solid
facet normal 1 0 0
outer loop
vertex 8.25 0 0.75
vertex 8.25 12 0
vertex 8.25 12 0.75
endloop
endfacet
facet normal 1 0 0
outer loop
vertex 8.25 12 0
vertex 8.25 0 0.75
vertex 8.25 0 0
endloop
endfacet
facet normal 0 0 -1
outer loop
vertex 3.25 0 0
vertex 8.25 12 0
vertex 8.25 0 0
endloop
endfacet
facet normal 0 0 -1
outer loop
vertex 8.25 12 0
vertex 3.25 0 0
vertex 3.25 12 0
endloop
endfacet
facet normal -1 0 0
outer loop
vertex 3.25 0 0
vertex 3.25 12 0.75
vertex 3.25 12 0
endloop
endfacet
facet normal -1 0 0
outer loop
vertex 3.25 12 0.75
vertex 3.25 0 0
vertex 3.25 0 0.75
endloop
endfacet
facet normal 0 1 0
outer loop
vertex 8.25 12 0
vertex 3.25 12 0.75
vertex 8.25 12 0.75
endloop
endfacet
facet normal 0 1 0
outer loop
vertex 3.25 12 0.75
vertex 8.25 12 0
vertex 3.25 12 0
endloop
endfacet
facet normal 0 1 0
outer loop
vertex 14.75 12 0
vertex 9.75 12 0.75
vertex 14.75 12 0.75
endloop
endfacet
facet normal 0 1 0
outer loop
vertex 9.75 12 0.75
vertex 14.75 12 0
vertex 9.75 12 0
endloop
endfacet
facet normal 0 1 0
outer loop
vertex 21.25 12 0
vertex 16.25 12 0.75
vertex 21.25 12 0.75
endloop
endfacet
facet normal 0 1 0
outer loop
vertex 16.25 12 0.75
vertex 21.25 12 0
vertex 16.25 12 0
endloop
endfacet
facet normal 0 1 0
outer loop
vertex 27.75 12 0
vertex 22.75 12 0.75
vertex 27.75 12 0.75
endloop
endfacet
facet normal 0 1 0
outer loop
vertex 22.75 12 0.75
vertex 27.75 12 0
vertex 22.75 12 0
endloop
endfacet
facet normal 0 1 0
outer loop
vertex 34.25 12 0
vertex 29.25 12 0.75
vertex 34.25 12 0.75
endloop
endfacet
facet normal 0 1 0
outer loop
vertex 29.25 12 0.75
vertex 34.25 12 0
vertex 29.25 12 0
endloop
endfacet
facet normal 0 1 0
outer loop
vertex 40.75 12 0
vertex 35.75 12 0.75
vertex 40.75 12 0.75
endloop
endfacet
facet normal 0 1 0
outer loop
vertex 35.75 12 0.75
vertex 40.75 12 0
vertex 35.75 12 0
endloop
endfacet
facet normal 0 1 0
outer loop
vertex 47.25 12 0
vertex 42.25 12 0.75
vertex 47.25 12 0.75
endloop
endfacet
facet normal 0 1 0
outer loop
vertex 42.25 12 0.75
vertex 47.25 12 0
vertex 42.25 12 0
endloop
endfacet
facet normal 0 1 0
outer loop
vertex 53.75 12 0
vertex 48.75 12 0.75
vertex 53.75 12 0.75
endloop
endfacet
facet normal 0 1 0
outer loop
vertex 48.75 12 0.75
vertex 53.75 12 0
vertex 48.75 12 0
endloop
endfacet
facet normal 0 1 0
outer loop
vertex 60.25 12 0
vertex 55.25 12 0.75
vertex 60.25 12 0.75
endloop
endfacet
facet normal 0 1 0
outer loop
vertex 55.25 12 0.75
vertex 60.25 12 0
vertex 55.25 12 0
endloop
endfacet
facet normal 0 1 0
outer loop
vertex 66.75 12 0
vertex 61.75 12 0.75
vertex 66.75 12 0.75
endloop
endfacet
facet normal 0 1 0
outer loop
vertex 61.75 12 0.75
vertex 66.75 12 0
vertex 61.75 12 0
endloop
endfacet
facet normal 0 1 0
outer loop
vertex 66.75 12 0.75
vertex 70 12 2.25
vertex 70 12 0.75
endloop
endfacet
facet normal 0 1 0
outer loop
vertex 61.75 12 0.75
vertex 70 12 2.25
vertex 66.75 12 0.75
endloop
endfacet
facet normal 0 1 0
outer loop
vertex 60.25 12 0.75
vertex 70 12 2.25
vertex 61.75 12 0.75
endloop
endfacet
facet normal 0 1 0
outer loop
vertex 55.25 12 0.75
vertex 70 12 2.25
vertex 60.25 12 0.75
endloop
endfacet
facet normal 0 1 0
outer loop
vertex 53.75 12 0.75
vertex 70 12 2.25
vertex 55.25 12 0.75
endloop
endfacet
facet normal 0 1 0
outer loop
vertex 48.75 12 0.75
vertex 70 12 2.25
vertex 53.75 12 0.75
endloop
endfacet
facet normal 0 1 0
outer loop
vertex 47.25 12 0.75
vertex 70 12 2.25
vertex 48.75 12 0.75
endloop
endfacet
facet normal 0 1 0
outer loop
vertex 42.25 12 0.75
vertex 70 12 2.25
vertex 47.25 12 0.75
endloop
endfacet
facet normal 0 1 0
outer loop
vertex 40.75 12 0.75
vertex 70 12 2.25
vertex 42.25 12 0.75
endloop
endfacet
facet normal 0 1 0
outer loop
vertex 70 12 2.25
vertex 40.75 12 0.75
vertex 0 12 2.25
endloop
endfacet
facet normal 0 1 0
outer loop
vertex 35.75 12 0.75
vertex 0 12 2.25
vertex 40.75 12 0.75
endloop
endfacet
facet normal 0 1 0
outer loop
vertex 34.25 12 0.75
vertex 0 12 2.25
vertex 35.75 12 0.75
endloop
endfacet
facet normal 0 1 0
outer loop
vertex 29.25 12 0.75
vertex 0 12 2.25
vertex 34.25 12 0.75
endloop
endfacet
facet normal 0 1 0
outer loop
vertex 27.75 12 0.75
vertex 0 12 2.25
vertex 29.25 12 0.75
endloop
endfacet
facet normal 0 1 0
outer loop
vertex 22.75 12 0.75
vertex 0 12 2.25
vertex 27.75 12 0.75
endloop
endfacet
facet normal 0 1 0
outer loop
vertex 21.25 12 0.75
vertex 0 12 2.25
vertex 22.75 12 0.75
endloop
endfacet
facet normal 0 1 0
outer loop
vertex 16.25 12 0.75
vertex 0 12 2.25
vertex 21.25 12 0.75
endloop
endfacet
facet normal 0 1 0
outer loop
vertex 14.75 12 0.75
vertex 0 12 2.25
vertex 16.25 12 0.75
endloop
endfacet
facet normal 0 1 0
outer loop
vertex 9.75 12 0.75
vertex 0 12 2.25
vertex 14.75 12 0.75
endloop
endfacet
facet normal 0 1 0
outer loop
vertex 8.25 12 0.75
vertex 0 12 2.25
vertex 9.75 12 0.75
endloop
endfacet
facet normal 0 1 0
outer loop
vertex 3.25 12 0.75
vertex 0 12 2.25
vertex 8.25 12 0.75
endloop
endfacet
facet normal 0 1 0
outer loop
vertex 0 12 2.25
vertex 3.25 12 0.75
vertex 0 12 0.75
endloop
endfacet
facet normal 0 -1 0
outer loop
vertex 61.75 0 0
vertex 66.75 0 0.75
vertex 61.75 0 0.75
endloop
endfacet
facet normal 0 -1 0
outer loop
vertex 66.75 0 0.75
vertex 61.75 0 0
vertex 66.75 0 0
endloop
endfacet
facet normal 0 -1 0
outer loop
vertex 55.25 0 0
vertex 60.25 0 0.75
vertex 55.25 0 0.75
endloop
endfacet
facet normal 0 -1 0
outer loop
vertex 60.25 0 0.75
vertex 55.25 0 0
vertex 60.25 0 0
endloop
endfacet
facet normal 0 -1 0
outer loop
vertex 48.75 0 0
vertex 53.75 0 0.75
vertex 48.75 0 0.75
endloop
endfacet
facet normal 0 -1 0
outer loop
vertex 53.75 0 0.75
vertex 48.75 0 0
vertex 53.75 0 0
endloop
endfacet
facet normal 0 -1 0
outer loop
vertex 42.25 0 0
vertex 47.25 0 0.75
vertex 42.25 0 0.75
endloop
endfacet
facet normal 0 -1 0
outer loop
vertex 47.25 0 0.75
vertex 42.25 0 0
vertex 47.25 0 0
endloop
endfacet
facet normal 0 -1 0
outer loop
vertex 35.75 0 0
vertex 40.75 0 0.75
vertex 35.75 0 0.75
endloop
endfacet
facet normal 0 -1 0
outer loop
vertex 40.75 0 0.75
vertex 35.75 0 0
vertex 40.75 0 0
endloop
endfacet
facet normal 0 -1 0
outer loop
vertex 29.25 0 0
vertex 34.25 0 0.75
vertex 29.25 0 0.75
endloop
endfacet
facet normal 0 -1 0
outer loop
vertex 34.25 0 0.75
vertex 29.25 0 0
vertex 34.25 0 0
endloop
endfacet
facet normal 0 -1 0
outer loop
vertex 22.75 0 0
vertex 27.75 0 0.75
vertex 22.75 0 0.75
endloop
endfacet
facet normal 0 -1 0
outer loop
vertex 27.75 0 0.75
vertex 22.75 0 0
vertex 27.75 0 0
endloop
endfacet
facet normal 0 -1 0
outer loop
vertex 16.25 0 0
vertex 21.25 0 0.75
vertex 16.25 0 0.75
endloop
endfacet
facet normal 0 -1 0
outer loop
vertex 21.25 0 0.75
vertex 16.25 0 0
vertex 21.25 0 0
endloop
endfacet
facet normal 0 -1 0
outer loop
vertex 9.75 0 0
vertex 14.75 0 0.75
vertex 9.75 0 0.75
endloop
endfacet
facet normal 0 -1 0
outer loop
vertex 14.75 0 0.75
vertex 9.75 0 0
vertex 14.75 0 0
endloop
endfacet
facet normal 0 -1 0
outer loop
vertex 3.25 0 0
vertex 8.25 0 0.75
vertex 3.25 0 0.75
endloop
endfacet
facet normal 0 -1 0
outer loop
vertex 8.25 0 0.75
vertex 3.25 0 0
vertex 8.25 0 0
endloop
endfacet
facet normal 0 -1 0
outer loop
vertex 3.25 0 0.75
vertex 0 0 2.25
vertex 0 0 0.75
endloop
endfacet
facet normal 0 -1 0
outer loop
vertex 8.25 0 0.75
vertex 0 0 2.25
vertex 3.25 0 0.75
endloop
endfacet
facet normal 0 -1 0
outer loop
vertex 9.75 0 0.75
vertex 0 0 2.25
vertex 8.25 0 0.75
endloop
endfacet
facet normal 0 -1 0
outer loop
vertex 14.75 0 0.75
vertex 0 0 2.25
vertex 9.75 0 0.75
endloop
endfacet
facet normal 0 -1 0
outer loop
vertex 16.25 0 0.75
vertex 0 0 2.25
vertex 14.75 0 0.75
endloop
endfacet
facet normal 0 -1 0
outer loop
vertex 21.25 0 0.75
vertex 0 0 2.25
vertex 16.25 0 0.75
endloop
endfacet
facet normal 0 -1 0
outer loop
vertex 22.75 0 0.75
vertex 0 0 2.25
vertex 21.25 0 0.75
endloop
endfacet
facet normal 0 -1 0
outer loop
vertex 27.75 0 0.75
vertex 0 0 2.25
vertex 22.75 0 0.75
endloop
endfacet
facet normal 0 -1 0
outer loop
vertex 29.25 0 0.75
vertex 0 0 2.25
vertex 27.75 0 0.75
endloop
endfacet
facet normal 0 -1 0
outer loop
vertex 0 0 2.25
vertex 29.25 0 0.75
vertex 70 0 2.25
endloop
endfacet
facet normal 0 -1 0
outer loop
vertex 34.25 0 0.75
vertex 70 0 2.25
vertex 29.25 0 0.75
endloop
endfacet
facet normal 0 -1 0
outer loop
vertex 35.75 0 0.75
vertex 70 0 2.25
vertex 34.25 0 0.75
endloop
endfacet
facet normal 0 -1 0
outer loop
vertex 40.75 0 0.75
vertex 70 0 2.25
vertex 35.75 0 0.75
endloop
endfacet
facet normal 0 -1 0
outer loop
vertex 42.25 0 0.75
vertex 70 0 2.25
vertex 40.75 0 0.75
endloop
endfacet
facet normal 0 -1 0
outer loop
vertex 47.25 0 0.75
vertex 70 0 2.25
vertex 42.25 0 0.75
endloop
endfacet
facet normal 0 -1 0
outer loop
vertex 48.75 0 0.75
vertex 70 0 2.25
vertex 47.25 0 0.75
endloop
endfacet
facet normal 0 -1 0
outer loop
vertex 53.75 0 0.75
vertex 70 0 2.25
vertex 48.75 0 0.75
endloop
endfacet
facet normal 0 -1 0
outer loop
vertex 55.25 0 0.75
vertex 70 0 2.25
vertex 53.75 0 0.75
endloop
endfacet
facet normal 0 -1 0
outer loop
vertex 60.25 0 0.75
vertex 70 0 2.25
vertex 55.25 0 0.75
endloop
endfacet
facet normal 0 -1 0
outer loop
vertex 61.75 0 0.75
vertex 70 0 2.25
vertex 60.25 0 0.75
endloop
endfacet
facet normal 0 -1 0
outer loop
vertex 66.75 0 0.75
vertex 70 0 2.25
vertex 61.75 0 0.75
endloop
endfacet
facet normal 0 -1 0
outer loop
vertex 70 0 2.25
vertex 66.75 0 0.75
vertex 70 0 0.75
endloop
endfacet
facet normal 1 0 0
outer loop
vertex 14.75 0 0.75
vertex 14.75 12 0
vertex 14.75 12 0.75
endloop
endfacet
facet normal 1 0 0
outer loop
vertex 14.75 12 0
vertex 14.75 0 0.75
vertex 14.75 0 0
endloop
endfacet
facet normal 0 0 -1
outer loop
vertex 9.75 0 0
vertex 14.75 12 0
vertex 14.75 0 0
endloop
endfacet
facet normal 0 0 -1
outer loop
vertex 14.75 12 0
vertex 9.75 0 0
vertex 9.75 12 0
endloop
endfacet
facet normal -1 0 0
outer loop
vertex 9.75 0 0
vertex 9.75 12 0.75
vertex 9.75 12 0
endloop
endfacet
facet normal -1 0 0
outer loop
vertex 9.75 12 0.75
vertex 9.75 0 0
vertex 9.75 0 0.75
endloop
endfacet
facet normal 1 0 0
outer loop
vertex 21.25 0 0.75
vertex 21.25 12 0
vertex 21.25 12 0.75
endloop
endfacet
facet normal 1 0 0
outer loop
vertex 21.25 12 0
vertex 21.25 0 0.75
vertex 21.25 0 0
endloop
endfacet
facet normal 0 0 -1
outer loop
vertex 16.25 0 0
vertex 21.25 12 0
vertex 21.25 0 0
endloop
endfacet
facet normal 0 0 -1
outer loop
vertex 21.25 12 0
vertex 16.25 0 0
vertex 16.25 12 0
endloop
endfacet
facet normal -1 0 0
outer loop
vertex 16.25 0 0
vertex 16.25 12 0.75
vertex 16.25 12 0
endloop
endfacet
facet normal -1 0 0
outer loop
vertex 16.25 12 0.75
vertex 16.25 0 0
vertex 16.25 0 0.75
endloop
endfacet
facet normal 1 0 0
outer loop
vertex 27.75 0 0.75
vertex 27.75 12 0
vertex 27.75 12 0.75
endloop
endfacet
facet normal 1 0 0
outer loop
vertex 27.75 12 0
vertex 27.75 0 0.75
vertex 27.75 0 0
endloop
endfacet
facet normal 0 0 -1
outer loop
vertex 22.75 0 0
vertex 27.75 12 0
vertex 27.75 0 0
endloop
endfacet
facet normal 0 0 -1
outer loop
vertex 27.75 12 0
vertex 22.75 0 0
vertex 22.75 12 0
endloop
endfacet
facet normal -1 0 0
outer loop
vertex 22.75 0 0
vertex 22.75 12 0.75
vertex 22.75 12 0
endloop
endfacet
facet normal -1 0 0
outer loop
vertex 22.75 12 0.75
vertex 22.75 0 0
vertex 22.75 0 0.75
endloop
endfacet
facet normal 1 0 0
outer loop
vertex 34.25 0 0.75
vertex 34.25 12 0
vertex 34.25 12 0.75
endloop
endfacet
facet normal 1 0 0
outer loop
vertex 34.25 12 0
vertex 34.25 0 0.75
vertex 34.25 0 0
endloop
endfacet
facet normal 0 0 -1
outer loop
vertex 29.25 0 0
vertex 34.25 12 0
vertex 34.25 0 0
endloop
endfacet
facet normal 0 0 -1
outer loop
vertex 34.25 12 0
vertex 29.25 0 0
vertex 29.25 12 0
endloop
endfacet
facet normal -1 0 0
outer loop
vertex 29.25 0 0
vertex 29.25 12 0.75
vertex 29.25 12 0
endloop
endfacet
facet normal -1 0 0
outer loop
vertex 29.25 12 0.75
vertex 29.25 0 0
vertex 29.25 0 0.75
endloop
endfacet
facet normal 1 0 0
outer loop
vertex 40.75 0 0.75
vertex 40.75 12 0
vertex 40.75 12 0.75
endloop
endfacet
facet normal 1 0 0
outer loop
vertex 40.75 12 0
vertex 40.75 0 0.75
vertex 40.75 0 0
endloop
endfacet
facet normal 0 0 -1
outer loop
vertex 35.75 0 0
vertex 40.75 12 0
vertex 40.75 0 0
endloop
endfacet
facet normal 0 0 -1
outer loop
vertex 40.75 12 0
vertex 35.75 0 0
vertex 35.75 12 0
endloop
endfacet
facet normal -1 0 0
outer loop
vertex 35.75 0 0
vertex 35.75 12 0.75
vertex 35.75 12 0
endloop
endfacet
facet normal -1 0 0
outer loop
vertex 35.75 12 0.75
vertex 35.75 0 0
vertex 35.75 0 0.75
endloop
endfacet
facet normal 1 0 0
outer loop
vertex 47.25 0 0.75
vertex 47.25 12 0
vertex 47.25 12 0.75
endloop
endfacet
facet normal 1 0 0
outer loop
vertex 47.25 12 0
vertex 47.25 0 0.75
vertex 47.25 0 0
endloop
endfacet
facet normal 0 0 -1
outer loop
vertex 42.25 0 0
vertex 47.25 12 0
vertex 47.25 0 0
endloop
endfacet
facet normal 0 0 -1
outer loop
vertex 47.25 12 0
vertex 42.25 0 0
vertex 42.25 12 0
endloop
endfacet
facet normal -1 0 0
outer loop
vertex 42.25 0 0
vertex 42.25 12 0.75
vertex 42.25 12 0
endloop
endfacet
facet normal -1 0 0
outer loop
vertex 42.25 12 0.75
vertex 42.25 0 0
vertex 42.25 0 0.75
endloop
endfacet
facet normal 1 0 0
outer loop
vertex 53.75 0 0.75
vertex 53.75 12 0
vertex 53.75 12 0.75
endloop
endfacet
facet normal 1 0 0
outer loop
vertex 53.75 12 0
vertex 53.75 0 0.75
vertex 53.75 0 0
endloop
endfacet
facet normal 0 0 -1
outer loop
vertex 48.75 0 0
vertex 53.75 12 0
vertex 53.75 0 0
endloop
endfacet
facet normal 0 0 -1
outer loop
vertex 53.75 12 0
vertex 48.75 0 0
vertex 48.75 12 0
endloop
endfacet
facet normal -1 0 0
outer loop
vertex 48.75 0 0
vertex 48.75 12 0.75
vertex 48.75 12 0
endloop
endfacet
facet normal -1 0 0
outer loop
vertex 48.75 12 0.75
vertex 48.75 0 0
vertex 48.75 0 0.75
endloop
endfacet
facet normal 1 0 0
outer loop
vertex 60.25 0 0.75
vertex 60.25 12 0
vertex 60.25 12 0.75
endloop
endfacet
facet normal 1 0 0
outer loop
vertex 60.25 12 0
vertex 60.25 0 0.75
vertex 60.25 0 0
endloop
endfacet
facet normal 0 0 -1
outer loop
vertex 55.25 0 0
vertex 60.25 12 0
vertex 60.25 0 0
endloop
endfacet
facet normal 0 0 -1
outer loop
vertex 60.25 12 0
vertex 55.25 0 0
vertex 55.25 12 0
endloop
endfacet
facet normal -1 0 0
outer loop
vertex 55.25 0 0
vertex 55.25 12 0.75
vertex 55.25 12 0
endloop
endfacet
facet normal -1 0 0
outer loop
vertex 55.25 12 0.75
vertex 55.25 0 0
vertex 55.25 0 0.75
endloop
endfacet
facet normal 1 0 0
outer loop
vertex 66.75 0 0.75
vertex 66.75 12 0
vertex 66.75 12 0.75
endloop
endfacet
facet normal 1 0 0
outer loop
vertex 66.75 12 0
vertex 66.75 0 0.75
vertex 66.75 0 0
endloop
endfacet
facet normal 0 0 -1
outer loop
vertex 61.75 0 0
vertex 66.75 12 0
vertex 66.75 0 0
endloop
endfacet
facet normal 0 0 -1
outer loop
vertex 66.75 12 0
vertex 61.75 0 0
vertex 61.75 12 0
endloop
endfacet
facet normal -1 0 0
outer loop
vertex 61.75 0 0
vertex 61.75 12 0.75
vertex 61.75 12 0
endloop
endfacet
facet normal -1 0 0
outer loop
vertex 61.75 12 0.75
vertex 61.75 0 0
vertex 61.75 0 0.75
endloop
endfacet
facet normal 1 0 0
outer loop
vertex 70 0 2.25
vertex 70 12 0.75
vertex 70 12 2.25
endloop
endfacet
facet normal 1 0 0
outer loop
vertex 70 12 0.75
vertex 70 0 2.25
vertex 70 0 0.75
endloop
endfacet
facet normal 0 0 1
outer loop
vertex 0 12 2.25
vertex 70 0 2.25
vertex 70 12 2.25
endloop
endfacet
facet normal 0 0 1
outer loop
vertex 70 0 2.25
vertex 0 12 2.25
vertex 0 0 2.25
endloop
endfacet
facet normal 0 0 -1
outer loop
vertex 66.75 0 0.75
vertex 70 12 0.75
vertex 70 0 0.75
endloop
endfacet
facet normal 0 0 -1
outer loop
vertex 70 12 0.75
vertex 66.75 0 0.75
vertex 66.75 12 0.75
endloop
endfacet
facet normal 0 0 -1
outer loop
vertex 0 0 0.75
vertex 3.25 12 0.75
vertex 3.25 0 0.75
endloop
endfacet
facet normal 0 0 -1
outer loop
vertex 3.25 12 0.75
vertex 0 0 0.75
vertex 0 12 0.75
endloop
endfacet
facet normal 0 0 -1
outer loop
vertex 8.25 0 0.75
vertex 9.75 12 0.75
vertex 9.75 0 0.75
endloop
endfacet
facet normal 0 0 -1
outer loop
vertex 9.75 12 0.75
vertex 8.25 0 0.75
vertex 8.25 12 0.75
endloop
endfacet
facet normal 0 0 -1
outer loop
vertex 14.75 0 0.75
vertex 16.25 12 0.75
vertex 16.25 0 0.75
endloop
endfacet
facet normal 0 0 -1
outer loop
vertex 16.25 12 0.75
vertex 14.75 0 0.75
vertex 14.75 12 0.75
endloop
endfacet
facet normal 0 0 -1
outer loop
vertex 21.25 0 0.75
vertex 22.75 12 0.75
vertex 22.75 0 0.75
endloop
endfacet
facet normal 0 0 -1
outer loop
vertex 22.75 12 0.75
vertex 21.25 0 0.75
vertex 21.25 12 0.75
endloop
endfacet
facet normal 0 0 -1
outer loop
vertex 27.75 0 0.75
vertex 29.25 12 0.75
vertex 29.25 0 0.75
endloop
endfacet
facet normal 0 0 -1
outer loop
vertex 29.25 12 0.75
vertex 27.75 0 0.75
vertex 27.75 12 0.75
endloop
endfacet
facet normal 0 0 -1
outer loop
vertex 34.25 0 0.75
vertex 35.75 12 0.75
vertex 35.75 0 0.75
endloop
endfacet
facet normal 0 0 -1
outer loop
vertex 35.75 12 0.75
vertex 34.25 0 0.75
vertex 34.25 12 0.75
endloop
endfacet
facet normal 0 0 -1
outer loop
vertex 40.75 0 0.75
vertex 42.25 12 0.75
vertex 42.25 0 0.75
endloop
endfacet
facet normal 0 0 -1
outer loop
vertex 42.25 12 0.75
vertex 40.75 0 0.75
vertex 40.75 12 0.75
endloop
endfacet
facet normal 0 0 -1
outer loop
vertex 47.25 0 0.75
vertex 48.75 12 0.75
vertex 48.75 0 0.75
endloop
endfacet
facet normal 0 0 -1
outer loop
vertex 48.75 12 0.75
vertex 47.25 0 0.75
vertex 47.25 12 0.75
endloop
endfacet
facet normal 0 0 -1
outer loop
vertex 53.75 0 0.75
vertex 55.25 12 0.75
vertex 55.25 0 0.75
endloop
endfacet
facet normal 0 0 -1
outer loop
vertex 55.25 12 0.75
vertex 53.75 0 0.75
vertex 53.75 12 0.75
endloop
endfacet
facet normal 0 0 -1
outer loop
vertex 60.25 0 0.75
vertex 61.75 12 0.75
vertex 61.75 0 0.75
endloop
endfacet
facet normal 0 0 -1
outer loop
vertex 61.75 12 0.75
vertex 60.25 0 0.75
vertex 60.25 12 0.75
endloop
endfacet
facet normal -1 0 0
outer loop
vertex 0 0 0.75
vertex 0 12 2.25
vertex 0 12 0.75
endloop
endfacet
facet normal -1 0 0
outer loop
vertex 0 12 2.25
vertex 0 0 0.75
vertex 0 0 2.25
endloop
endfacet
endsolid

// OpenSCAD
$fn = 64;

// Dimensions
SPINE_LENGTH_X = 70;
SPINE_WIDTH_Y = 12;
SPINE_THICK_Z = 1.5;

TOOTH_COUNT = 10;
TOOTH_WIDTH_X = 5.0;
TOOTH_LENGTH_Y = 12;
TOOTH_THICK_Z = 1.5; // Same as spine

GAP_X = 1.5;

// Calculated positions
// Spine is centered at origin (0,0,0)
// Spine Y range: -6 to +6
// Teeth hang from Y=6 edge in -Y direction
// Teeth Y range: 6 to -6 (matches spine width)
// Teeth are centered on the spine in X

// Total length of teeth row including gaps
// 10 teeth * 5.0 + 9 gaps * 1.5 = 50 + 13.5 = 63.5 mm
// Center the row in X (0 to 70)
// Row length = 63.5
// Center offset = (70 - 63.5) / 2 = 3.25 mm

// Tooth positions in X
// Start X = 3.25
// Step X = 5.0 + 1.5 = 6.5

// Tooth positions in Y
// Hang from Y=6 edge in -Y direction
// Tooth Y range: 6 to -6
// Tooth center Y = 0

// Combine spine and teeth
union() {
    // Spine
    translate([0, 0, SPINE_THICK_Z/2])
    cube([SPINE_LENGTH_X, SPINE_WIDTH_Y, SPINE_THICK_Z]);

    // Teeth
    for (i = [0 : TOOTH_COUNT - 1]) {
        // Calculate X position for this tooth
        // Center offset
        x_center = (SPINE_LENGTH_X - (TOOTH_COUNT * TOOTH_WIDTH_X + (TOOTH_COUNT - 1) * GAP_X)) / 2;
        x_pos = x_center + i * (TOOTH_WIDTH_X + GAP_X);

        // Translate to position
        translate([x_pos, 0, 0])
        // Tooth hangs from spine in -Y direction
        // Tooth Y range: 6 to -6
        // Tooth X range: -2.5 to +2.5 (width 5)
        // Tooth Z range: 0 to 1.5
        cube([TOOTH_WIDTH_X, TOOTH_LENGTH_Y, TOOTH_THICK_Z]);
    }
}
